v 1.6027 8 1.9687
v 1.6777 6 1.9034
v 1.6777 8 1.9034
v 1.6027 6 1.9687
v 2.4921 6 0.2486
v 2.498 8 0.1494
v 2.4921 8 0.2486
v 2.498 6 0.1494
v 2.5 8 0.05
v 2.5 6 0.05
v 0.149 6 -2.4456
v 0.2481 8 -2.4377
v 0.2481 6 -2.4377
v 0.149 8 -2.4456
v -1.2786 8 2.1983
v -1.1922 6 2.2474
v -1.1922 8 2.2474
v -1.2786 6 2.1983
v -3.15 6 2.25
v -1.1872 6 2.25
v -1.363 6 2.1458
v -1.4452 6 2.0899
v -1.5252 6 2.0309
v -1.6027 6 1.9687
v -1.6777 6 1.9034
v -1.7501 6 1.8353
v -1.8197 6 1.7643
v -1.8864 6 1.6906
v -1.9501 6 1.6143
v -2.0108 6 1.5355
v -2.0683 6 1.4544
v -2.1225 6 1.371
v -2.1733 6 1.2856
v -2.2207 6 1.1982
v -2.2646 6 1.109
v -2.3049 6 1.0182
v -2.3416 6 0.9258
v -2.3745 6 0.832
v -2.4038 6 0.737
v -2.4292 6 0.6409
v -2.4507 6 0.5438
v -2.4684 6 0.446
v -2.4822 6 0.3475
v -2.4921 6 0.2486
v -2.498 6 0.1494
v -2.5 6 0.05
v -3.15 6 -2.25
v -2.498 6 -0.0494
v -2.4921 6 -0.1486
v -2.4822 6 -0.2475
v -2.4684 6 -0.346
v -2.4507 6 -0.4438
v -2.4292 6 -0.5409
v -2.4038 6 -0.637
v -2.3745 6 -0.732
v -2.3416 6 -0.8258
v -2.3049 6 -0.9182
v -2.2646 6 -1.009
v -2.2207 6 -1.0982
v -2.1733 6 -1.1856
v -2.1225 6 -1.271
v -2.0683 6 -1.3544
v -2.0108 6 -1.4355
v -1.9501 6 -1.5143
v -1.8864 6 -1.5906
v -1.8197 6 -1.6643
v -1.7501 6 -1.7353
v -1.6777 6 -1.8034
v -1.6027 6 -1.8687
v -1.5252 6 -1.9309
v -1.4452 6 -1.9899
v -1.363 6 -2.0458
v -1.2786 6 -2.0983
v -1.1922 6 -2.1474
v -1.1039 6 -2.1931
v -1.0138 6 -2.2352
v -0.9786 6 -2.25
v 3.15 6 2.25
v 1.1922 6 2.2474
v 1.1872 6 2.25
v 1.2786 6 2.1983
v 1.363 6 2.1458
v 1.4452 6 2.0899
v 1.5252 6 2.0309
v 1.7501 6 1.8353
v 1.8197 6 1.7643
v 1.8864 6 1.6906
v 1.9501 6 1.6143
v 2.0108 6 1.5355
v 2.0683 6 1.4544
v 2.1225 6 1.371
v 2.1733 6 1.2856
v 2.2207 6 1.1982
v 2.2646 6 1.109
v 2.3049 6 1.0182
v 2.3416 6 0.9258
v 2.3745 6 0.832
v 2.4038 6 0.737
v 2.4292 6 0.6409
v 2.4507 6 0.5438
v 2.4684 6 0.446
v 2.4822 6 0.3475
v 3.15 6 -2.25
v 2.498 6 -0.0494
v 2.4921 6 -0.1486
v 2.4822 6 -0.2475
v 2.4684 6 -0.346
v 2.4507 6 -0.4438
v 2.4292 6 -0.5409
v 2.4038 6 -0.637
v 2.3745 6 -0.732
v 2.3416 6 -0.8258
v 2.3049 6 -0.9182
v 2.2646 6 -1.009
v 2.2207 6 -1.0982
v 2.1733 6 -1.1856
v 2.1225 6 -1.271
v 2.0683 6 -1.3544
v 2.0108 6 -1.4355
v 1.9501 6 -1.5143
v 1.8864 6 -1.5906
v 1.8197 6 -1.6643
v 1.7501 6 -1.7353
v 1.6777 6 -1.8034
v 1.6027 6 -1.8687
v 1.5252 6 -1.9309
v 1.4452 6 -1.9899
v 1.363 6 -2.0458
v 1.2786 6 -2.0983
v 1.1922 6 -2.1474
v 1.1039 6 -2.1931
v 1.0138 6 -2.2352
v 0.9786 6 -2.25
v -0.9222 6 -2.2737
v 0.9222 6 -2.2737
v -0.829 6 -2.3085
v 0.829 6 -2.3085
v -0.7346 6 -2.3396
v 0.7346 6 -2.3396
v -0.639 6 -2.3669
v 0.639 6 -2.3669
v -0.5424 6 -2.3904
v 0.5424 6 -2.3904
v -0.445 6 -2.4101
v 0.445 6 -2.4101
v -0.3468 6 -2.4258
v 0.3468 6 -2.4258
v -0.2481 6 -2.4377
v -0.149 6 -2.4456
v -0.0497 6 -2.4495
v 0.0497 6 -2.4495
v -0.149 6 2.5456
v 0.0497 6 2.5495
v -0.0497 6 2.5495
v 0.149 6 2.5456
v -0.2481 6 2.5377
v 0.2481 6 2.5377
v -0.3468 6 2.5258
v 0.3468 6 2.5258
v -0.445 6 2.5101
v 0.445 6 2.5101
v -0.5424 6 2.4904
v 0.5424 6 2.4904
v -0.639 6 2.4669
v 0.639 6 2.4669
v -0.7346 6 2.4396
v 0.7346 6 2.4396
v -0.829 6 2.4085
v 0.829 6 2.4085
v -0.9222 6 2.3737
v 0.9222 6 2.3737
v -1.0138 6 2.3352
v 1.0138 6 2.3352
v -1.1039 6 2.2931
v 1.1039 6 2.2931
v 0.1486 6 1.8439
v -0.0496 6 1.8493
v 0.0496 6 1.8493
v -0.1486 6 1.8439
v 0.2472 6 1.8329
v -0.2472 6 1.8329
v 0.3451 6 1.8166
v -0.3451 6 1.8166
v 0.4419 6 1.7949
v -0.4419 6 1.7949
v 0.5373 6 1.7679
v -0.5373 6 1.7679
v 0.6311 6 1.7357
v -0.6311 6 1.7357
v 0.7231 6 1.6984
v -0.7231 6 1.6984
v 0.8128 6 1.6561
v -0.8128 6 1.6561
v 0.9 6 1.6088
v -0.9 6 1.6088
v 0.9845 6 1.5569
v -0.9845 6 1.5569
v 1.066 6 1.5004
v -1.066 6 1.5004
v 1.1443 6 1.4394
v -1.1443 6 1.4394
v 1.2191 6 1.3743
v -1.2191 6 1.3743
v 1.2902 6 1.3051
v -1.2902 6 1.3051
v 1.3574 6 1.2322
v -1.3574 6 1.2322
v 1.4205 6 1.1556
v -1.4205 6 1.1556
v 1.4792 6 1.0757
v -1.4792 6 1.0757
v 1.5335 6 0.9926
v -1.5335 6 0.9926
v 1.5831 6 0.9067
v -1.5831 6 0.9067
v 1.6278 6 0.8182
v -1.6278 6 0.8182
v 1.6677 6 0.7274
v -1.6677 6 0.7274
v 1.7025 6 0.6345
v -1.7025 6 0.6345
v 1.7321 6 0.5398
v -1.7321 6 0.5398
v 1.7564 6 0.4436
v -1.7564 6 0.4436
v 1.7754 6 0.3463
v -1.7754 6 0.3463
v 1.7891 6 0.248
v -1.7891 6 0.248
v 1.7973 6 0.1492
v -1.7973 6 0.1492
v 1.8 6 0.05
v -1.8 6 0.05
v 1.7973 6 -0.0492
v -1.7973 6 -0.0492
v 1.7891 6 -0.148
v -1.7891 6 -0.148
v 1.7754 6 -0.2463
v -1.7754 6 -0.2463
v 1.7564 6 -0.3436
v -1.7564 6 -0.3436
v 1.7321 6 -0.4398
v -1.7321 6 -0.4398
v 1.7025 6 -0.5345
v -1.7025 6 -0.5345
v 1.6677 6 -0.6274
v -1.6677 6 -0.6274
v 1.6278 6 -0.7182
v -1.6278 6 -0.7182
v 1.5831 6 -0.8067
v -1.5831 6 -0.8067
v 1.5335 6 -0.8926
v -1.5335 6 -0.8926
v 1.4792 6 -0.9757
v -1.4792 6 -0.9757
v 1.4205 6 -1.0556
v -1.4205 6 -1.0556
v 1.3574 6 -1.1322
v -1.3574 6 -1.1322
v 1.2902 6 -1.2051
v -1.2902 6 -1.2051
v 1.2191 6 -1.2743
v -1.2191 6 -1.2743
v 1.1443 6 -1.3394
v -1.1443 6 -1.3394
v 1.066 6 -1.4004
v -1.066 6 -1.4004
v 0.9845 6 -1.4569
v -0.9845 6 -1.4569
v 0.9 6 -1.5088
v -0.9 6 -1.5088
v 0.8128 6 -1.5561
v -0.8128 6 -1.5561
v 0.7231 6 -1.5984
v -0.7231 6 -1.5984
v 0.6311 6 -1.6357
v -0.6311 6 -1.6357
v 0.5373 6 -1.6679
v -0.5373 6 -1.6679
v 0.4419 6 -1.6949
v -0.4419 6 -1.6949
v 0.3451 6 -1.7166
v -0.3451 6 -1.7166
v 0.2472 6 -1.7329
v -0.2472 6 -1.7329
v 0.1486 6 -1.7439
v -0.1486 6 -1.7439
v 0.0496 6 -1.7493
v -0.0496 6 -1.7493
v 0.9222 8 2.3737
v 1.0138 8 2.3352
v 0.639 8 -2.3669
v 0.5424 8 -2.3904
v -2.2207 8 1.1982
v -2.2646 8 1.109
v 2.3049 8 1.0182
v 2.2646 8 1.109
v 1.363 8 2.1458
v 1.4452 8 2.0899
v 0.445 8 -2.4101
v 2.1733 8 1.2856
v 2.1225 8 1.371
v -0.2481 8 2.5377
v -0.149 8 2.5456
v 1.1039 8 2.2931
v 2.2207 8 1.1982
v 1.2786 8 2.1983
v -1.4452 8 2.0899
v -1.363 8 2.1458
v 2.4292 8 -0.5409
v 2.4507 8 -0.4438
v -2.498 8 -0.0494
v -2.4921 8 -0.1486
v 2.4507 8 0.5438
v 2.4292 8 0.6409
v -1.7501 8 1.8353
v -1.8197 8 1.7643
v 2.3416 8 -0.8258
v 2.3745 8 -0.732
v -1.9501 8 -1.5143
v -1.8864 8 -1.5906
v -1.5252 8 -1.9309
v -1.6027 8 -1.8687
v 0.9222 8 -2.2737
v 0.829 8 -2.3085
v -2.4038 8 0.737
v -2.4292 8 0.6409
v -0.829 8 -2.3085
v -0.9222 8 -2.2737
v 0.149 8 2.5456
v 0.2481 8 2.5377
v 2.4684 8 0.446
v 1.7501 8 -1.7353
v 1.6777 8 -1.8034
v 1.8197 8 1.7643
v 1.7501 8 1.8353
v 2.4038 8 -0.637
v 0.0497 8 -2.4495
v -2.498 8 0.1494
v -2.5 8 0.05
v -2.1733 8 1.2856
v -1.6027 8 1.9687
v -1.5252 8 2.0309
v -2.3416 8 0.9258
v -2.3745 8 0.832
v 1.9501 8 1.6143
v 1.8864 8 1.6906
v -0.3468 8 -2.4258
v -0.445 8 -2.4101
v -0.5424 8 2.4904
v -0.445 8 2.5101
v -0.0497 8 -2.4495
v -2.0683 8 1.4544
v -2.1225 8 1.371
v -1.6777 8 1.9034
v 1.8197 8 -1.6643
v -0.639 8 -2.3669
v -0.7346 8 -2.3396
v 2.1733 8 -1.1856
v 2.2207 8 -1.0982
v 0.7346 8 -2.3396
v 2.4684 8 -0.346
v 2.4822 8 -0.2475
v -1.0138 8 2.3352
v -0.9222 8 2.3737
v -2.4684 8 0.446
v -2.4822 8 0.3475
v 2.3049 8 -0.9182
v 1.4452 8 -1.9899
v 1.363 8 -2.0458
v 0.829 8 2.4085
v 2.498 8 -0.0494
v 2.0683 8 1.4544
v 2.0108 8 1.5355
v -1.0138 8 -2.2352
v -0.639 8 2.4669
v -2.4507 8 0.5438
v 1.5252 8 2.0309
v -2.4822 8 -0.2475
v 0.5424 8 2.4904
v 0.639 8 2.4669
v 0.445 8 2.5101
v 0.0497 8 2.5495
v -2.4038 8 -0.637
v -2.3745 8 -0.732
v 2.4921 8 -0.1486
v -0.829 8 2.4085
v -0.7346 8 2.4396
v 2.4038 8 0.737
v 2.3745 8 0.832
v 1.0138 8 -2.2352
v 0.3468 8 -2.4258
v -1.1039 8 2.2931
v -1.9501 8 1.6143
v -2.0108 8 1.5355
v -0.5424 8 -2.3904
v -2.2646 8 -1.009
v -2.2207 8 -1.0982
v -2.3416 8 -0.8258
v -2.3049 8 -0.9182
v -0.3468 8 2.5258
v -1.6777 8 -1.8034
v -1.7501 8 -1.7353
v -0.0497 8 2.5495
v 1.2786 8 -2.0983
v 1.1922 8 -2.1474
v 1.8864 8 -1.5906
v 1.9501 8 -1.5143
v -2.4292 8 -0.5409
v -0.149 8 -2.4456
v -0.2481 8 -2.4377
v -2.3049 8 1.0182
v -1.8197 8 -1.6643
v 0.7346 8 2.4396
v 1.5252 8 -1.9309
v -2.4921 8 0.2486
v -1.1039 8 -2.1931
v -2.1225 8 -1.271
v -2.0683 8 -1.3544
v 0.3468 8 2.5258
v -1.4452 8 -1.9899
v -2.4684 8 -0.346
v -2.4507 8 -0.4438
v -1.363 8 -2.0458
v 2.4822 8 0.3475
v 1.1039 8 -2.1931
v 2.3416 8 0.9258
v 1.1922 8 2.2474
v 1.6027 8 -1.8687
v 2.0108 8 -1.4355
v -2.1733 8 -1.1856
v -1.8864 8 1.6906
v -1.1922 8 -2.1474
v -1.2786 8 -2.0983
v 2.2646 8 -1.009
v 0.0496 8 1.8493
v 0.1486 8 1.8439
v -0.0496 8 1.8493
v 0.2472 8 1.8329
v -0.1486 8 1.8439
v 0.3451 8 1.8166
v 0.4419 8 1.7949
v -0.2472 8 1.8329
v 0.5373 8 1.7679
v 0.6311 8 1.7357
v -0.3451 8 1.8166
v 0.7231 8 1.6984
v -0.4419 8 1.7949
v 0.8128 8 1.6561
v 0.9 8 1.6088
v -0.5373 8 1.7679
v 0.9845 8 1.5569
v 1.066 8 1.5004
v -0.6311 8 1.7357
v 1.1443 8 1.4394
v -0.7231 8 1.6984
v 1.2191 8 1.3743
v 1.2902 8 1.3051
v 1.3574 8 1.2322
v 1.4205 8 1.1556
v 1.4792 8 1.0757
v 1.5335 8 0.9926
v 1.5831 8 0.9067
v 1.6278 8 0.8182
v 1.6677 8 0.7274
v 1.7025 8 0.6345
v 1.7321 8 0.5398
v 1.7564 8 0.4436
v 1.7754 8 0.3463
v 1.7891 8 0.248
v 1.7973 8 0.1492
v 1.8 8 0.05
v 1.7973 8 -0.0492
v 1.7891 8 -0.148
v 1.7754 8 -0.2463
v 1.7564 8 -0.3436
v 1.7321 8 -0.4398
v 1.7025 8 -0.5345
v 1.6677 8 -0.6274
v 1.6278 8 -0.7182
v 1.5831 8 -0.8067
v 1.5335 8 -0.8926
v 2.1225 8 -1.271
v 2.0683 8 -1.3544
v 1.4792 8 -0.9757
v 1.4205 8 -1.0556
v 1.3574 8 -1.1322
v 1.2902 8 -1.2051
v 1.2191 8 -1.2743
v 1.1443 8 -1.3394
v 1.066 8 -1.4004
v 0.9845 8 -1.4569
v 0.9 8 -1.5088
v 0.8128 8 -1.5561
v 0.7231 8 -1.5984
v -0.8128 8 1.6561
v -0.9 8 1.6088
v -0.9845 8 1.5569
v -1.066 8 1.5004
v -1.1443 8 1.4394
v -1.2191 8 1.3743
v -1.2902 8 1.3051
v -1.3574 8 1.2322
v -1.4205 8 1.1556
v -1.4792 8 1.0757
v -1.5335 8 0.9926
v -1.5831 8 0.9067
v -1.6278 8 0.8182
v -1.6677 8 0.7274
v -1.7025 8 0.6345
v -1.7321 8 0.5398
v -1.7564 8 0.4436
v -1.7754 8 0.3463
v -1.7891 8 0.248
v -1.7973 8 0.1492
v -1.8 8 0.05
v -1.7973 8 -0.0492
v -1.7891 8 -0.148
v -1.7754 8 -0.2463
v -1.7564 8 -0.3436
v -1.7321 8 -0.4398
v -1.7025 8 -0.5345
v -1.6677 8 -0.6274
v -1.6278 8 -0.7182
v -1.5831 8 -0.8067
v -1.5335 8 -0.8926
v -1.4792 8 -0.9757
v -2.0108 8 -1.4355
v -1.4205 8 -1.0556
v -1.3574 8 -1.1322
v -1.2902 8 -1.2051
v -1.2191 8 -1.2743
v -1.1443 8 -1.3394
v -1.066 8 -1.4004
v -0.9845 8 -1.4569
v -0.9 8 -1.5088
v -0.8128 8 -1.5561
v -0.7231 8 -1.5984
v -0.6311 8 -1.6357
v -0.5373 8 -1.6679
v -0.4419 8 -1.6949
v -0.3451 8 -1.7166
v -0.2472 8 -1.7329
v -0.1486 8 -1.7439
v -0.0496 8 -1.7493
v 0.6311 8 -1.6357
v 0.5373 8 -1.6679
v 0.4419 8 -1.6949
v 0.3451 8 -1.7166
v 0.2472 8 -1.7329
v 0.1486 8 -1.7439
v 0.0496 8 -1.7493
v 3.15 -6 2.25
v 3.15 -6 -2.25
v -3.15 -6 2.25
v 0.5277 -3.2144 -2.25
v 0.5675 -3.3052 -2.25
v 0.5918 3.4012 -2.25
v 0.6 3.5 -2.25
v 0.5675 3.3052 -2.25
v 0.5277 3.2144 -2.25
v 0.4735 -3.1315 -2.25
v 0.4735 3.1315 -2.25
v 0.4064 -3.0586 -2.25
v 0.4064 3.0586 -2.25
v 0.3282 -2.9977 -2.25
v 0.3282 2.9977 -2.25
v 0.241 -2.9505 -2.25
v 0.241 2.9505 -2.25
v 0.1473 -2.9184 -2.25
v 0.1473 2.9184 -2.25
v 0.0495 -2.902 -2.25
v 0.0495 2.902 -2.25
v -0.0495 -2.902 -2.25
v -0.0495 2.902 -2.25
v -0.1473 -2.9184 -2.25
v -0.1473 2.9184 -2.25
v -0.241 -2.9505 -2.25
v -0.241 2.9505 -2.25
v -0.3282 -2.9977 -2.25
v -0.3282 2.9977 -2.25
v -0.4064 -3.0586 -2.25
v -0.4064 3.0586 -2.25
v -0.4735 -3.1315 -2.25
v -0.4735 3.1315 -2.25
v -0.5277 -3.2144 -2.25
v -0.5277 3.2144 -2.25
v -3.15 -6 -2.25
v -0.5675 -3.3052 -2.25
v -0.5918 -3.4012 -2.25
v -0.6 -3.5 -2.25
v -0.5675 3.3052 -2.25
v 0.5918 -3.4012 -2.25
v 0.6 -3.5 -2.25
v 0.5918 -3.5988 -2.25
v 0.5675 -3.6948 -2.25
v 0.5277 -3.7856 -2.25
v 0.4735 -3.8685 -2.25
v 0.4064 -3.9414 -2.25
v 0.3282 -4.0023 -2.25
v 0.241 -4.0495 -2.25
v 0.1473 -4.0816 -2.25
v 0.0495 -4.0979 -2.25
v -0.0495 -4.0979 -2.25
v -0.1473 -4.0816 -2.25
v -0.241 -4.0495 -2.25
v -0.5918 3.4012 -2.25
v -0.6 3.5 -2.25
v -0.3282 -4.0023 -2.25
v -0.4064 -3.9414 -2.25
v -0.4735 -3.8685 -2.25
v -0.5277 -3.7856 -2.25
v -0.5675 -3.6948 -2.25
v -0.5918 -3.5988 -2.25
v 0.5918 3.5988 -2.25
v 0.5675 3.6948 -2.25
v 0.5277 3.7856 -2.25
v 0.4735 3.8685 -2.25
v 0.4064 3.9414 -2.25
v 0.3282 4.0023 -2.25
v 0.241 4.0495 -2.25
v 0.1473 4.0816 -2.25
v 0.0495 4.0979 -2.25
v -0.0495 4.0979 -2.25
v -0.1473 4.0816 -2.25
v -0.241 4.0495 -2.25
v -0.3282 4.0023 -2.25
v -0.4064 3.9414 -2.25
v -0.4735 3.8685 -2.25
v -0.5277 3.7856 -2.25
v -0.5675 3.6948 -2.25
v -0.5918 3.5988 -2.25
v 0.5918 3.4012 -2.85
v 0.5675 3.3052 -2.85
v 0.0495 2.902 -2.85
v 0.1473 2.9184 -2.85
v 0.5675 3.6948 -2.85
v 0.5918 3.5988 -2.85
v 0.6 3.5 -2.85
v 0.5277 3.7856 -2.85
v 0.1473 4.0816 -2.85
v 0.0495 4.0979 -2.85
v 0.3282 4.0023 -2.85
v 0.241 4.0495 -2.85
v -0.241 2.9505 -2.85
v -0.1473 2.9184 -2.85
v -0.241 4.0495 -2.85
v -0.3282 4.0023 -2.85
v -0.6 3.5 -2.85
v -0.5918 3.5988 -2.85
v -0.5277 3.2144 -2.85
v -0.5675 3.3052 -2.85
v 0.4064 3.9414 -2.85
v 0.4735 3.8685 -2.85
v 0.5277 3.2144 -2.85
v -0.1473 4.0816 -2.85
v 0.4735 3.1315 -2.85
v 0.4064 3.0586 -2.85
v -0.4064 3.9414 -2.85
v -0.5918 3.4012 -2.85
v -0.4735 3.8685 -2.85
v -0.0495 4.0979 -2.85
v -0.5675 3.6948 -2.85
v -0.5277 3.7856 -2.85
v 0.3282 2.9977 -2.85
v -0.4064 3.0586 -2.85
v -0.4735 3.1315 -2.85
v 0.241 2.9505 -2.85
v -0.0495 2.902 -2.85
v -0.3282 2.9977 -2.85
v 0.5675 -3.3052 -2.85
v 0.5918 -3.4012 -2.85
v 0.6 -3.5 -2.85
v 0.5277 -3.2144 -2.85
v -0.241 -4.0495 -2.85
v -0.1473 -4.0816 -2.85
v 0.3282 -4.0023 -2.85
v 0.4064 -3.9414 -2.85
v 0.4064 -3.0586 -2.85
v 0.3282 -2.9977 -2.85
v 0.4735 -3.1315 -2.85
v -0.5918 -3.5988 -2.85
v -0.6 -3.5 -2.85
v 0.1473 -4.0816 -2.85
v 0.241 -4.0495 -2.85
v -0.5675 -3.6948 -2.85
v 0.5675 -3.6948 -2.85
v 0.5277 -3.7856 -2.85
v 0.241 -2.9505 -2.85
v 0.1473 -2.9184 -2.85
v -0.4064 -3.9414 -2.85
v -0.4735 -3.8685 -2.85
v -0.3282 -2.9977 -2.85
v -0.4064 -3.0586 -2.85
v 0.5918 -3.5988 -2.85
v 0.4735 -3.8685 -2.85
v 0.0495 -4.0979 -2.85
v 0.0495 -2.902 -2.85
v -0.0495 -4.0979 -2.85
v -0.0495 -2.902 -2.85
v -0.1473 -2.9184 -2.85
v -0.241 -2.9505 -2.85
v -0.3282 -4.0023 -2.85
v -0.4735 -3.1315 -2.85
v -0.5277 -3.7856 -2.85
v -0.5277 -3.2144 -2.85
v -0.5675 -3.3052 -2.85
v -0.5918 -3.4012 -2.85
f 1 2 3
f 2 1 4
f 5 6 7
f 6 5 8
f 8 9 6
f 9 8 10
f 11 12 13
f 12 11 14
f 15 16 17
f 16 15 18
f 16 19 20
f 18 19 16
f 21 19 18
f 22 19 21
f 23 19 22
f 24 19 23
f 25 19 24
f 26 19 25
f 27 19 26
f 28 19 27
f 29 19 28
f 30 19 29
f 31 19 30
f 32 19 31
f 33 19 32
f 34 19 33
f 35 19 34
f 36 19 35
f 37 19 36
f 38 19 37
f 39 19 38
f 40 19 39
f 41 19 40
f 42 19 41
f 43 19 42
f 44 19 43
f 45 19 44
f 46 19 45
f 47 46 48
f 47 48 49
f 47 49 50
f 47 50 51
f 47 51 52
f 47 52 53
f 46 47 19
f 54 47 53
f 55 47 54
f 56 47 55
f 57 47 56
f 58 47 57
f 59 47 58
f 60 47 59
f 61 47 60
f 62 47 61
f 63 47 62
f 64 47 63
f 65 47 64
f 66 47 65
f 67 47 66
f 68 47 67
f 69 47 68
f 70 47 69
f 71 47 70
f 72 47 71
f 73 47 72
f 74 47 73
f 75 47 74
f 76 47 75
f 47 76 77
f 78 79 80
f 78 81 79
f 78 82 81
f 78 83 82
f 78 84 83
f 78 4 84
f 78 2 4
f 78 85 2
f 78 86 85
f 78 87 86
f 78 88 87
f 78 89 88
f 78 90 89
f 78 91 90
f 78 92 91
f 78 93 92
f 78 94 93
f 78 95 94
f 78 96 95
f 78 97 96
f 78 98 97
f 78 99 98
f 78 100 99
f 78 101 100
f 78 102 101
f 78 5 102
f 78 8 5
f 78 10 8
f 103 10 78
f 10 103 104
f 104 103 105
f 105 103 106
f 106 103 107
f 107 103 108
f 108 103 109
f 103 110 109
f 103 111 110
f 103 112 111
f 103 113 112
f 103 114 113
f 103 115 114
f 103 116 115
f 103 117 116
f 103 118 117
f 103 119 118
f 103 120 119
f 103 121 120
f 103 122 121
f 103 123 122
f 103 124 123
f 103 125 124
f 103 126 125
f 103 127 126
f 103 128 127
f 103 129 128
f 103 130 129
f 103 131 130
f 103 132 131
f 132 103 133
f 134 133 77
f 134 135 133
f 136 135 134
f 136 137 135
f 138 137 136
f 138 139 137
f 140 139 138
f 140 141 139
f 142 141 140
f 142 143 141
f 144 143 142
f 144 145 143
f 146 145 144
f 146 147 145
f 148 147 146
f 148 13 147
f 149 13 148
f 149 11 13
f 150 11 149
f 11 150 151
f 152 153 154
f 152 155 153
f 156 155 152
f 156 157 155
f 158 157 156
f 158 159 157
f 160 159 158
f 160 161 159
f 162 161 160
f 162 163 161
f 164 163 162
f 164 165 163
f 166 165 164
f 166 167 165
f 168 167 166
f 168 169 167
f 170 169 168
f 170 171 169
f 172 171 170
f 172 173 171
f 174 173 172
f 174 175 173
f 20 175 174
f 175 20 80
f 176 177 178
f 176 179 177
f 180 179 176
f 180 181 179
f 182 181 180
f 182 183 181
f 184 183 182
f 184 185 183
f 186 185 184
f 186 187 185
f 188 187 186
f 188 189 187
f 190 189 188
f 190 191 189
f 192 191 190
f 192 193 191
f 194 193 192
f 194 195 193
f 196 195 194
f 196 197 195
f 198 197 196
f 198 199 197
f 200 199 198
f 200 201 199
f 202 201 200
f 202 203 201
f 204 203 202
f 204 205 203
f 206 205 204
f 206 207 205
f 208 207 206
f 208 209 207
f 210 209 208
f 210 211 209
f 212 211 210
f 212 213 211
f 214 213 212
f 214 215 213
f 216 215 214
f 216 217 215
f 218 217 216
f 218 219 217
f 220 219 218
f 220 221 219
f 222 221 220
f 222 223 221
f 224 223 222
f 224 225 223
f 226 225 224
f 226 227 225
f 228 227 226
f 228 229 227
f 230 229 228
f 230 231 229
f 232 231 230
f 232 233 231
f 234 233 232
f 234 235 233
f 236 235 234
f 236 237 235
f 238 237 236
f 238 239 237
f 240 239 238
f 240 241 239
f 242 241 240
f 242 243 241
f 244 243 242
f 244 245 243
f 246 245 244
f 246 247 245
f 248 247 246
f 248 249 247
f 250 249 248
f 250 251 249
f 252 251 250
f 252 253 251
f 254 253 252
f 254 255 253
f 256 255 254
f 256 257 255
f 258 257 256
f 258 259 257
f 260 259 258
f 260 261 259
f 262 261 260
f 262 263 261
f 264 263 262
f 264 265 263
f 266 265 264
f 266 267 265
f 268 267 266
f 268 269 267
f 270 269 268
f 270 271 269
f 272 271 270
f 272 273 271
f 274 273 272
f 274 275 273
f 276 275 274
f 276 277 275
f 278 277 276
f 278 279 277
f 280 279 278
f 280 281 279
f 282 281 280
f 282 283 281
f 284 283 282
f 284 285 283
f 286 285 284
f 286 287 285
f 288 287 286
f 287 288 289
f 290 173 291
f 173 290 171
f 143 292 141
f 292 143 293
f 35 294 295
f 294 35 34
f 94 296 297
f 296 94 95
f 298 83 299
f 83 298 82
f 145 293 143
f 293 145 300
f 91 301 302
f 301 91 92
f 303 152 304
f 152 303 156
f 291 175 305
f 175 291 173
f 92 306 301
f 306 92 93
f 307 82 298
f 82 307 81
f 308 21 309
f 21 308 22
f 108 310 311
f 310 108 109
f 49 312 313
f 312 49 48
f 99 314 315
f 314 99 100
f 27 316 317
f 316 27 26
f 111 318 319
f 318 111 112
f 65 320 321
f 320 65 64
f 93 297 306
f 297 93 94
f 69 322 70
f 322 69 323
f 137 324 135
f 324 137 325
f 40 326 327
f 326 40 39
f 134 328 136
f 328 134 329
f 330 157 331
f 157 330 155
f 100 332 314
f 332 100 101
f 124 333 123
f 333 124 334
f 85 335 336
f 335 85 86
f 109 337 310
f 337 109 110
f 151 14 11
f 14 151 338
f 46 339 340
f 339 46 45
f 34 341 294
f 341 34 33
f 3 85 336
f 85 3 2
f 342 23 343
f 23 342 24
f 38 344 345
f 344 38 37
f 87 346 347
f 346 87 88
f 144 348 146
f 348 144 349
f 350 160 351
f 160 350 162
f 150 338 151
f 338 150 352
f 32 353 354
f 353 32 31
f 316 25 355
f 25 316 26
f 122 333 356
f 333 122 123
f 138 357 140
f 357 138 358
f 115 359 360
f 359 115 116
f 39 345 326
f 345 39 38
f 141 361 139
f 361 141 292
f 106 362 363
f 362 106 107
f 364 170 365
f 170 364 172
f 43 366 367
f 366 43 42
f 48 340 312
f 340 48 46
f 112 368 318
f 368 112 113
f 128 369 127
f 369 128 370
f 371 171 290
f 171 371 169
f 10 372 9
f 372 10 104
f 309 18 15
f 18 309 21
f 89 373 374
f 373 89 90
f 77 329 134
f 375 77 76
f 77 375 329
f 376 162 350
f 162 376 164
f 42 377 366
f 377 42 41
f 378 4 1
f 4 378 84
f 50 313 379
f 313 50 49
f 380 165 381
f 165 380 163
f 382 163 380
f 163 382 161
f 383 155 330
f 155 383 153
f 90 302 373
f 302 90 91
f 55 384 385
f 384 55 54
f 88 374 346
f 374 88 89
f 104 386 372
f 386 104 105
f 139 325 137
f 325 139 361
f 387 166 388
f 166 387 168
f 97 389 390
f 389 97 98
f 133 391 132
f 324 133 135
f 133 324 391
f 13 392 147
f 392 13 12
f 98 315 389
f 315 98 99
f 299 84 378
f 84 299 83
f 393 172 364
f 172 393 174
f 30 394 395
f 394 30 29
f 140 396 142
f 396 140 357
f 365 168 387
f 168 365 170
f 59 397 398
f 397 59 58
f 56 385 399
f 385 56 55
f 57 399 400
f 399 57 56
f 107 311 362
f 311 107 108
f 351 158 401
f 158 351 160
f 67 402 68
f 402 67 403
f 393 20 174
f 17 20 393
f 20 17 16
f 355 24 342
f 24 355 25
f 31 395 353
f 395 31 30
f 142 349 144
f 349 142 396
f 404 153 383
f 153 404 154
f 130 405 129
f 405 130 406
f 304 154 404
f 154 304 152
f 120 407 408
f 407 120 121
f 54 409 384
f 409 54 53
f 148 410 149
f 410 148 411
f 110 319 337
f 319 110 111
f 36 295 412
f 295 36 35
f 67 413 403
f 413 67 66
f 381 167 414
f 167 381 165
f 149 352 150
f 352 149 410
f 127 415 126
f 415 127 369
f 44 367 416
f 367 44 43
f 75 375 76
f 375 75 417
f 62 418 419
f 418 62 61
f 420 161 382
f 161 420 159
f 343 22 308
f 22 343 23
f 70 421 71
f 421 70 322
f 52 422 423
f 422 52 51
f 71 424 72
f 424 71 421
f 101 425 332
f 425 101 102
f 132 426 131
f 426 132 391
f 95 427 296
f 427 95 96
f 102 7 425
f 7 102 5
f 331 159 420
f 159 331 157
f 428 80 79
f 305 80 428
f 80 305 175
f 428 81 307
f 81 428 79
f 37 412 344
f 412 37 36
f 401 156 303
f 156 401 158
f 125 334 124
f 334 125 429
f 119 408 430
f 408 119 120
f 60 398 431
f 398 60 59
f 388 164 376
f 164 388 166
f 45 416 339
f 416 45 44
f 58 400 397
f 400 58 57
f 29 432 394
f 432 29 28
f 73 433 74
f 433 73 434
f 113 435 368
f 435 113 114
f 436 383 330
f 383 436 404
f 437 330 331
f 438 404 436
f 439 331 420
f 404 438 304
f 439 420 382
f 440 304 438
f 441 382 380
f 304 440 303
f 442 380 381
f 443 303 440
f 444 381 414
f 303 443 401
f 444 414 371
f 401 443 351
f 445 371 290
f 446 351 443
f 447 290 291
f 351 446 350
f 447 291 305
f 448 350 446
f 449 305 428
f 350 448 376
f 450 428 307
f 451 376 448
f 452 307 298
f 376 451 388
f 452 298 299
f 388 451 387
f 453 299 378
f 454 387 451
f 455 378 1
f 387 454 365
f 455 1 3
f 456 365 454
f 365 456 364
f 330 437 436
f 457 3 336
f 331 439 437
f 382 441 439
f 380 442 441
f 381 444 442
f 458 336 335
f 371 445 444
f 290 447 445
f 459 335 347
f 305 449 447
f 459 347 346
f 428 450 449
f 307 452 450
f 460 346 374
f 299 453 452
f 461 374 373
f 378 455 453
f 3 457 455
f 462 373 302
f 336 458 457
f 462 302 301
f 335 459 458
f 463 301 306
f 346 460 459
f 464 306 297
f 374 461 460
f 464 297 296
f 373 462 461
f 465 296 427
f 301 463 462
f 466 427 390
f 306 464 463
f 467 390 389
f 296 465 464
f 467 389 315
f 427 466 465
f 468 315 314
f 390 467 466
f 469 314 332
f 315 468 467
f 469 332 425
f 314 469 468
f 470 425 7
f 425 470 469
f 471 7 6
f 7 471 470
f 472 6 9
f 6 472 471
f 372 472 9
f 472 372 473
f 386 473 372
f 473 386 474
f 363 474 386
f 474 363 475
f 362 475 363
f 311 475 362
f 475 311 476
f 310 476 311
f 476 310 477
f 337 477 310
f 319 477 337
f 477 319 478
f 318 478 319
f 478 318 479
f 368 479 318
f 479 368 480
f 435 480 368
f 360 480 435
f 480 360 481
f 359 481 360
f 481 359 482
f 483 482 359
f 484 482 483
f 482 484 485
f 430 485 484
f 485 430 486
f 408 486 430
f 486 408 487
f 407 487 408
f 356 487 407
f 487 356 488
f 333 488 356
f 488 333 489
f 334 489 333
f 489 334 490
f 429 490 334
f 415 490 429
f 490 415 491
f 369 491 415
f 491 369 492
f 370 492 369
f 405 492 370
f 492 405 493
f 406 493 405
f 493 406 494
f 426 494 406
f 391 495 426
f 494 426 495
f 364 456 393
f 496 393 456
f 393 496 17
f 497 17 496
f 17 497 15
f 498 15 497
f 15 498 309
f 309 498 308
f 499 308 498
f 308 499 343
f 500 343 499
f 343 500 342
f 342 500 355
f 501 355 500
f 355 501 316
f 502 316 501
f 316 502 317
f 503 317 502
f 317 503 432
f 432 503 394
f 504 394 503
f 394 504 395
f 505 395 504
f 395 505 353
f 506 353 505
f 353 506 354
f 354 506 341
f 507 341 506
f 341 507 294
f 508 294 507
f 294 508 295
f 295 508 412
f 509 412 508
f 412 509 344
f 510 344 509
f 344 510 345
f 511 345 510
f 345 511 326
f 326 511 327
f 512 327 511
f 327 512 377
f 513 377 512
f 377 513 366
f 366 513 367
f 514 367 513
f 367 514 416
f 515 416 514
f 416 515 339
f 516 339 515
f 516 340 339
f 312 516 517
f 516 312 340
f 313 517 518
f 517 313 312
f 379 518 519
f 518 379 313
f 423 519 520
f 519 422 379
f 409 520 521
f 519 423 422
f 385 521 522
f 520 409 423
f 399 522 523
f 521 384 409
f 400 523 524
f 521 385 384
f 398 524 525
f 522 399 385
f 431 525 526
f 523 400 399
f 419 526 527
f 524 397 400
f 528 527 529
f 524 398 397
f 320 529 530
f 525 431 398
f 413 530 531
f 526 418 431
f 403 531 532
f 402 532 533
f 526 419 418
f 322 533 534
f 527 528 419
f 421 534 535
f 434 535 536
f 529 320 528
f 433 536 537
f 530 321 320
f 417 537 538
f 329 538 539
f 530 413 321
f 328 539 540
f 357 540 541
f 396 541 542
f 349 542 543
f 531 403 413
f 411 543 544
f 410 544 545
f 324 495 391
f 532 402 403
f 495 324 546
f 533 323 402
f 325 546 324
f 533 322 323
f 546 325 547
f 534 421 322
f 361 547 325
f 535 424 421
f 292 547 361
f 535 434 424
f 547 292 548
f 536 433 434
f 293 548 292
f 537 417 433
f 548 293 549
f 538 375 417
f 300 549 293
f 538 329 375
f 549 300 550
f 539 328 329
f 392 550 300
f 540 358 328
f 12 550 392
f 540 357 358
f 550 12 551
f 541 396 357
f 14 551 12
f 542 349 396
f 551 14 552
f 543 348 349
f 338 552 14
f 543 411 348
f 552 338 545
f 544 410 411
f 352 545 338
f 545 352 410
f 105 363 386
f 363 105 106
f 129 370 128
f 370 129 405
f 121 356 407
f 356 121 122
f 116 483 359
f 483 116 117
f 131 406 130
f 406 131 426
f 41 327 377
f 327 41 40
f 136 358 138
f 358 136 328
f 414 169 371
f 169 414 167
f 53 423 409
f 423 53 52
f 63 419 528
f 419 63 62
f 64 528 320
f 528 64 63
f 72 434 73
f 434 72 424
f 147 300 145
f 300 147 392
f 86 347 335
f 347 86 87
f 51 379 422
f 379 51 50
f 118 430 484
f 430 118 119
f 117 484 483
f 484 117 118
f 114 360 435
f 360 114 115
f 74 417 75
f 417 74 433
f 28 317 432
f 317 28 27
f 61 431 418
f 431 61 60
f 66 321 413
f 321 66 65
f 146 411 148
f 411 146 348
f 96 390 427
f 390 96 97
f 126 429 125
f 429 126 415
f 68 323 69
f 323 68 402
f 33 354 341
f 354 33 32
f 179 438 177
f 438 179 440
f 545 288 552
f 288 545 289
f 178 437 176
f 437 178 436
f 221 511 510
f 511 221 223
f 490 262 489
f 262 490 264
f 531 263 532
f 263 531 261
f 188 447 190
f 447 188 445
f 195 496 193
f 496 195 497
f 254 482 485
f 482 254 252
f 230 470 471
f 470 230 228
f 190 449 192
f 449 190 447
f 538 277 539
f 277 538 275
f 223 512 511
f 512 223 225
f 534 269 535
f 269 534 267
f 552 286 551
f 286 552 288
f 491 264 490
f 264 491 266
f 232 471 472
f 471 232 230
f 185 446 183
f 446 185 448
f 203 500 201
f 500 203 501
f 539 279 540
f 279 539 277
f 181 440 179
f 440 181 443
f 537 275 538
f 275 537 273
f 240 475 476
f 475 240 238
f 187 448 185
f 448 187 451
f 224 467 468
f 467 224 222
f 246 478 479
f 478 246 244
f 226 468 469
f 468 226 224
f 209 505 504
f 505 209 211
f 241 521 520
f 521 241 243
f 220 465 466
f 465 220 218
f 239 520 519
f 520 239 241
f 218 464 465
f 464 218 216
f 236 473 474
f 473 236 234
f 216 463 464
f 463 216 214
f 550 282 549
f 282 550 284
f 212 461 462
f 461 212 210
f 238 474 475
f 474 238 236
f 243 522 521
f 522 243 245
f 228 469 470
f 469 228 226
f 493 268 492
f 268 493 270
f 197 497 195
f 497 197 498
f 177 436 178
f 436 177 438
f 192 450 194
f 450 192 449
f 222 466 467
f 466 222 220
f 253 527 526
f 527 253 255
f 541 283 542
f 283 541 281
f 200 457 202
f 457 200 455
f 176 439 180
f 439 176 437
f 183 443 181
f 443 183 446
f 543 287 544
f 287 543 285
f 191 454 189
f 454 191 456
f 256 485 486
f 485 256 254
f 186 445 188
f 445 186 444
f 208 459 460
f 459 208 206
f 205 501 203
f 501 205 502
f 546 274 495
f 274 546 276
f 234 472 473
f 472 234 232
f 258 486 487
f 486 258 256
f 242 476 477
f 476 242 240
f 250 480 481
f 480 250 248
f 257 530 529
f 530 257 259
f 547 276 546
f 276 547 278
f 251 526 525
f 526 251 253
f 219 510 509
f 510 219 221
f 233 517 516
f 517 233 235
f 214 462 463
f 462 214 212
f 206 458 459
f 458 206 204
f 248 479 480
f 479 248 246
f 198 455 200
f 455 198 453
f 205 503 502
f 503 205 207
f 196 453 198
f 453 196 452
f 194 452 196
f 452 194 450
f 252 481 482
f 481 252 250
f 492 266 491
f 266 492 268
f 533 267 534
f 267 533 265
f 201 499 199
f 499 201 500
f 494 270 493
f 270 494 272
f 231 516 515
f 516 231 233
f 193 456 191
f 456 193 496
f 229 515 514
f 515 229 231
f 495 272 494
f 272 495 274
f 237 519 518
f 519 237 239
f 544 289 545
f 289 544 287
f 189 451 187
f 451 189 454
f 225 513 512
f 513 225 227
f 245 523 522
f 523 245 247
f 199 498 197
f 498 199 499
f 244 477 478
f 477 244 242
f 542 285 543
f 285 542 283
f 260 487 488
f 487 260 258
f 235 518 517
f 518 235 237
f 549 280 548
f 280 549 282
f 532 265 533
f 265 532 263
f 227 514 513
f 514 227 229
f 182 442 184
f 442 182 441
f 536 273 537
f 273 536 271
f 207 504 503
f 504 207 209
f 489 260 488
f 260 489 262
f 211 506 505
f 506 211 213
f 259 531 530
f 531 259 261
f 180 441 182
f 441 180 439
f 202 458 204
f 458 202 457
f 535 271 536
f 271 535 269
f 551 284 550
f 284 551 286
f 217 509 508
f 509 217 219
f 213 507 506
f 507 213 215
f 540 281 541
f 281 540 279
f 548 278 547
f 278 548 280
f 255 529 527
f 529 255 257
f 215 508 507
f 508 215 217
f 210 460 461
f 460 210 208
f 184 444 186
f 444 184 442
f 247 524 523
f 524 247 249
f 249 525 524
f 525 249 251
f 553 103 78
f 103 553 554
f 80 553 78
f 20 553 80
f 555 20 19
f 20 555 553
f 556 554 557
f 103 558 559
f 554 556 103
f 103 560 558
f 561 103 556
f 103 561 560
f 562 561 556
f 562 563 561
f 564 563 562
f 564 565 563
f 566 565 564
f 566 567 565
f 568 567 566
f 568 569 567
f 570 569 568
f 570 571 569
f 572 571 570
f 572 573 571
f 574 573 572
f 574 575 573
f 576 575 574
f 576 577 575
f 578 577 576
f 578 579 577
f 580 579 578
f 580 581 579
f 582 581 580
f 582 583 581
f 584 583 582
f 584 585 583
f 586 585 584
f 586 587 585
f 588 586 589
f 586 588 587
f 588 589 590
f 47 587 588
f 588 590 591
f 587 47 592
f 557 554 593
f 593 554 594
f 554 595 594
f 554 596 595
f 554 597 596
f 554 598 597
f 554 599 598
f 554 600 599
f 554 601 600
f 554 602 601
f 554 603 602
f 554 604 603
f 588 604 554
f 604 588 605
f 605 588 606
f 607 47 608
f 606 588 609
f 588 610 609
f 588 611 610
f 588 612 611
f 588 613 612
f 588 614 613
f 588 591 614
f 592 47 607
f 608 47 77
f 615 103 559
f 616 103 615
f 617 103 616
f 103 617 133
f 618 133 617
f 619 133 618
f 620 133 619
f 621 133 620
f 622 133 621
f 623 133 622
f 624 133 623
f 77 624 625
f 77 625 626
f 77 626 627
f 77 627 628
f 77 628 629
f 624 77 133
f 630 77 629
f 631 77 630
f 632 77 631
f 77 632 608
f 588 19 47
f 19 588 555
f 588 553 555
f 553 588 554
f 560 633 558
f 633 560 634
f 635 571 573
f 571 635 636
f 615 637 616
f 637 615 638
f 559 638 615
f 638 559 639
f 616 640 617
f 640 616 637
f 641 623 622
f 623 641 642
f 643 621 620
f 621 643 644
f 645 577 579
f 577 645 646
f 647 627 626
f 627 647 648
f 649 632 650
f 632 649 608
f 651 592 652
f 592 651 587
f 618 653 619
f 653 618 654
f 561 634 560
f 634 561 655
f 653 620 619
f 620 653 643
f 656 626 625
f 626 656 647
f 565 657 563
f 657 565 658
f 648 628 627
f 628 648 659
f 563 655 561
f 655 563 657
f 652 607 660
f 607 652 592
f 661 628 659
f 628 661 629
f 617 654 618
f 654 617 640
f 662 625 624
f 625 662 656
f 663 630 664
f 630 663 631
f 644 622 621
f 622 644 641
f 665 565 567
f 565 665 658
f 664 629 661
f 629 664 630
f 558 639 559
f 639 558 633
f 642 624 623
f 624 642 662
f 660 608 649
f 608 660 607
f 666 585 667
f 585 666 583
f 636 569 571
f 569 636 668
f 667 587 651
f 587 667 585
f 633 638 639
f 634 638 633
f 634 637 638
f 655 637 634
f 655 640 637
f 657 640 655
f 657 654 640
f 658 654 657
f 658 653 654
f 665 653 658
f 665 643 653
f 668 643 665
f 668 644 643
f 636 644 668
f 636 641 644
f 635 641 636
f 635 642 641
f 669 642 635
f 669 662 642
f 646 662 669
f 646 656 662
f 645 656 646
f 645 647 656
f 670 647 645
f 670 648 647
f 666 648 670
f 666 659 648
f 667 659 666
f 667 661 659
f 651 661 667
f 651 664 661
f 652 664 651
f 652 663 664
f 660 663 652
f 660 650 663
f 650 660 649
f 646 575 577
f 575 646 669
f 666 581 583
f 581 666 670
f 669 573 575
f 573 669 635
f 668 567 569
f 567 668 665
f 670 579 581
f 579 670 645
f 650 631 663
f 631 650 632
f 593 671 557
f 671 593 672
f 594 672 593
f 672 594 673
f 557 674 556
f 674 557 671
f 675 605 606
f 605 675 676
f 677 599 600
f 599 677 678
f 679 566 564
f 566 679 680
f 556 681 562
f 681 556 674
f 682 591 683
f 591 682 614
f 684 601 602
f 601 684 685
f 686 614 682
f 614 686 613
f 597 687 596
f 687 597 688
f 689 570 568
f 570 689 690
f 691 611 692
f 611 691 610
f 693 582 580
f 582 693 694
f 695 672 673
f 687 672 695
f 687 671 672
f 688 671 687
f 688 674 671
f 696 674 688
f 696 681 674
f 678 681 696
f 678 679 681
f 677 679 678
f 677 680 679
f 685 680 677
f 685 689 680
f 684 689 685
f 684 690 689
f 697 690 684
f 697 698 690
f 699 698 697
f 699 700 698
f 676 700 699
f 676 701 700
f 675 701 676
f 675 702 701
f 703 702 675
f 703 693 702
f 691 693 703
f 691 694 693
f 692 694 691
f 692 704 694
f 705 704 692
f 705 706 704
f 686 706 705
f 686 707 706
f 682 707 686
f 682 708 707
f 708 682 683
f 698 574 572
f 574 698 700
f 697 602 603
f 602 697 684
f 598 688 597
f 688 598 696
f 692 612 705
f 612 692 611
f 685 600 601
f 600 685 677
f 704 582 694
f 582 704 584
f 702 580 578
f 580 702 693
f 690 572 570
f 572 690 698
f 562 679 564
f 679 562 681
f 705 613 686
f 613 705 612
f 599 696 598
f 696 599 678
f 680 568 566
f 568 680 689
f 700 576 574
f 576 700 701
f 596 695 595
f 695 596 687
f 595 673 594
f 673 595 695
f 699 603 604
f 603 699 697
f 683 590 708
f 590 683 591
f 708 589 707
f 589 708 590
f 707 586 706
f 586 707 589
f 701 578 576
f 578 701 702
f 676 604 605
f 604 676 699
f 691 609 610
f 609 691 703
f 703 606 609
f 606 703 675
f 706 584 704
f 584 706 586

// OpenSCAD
/*
 * PJ-3420.scad - Stereo 3.5mm audio socket
 * 
 * Copyright (C) 2015-2020 Theophilus
 *
 * osab
 *
 * License: Matthew 10:8b - "freely ye have received, freely give."
 *
 * Use this information at your own risk.
 *
 */

$fa=0.1; // default minimum facet angle is now 0.1
$fs=0.1; // default minimum facet size is now 0.1 mm

cube([6.3,12,4.5],center=true);
translate([0,7,0.05]) rotate([90,0,0]) difference() {
	cylinder(h=2,d=5,center=true);
	cylinder(h=2.1,d=3.6,center=true);
}

translate([0,3.5,-2.55]) cylinder(h=0.6,d=1.2,center=true);
translate([0,-3.5,-2.55]) cylinder(h=0.6,d=1.2,center=true);
